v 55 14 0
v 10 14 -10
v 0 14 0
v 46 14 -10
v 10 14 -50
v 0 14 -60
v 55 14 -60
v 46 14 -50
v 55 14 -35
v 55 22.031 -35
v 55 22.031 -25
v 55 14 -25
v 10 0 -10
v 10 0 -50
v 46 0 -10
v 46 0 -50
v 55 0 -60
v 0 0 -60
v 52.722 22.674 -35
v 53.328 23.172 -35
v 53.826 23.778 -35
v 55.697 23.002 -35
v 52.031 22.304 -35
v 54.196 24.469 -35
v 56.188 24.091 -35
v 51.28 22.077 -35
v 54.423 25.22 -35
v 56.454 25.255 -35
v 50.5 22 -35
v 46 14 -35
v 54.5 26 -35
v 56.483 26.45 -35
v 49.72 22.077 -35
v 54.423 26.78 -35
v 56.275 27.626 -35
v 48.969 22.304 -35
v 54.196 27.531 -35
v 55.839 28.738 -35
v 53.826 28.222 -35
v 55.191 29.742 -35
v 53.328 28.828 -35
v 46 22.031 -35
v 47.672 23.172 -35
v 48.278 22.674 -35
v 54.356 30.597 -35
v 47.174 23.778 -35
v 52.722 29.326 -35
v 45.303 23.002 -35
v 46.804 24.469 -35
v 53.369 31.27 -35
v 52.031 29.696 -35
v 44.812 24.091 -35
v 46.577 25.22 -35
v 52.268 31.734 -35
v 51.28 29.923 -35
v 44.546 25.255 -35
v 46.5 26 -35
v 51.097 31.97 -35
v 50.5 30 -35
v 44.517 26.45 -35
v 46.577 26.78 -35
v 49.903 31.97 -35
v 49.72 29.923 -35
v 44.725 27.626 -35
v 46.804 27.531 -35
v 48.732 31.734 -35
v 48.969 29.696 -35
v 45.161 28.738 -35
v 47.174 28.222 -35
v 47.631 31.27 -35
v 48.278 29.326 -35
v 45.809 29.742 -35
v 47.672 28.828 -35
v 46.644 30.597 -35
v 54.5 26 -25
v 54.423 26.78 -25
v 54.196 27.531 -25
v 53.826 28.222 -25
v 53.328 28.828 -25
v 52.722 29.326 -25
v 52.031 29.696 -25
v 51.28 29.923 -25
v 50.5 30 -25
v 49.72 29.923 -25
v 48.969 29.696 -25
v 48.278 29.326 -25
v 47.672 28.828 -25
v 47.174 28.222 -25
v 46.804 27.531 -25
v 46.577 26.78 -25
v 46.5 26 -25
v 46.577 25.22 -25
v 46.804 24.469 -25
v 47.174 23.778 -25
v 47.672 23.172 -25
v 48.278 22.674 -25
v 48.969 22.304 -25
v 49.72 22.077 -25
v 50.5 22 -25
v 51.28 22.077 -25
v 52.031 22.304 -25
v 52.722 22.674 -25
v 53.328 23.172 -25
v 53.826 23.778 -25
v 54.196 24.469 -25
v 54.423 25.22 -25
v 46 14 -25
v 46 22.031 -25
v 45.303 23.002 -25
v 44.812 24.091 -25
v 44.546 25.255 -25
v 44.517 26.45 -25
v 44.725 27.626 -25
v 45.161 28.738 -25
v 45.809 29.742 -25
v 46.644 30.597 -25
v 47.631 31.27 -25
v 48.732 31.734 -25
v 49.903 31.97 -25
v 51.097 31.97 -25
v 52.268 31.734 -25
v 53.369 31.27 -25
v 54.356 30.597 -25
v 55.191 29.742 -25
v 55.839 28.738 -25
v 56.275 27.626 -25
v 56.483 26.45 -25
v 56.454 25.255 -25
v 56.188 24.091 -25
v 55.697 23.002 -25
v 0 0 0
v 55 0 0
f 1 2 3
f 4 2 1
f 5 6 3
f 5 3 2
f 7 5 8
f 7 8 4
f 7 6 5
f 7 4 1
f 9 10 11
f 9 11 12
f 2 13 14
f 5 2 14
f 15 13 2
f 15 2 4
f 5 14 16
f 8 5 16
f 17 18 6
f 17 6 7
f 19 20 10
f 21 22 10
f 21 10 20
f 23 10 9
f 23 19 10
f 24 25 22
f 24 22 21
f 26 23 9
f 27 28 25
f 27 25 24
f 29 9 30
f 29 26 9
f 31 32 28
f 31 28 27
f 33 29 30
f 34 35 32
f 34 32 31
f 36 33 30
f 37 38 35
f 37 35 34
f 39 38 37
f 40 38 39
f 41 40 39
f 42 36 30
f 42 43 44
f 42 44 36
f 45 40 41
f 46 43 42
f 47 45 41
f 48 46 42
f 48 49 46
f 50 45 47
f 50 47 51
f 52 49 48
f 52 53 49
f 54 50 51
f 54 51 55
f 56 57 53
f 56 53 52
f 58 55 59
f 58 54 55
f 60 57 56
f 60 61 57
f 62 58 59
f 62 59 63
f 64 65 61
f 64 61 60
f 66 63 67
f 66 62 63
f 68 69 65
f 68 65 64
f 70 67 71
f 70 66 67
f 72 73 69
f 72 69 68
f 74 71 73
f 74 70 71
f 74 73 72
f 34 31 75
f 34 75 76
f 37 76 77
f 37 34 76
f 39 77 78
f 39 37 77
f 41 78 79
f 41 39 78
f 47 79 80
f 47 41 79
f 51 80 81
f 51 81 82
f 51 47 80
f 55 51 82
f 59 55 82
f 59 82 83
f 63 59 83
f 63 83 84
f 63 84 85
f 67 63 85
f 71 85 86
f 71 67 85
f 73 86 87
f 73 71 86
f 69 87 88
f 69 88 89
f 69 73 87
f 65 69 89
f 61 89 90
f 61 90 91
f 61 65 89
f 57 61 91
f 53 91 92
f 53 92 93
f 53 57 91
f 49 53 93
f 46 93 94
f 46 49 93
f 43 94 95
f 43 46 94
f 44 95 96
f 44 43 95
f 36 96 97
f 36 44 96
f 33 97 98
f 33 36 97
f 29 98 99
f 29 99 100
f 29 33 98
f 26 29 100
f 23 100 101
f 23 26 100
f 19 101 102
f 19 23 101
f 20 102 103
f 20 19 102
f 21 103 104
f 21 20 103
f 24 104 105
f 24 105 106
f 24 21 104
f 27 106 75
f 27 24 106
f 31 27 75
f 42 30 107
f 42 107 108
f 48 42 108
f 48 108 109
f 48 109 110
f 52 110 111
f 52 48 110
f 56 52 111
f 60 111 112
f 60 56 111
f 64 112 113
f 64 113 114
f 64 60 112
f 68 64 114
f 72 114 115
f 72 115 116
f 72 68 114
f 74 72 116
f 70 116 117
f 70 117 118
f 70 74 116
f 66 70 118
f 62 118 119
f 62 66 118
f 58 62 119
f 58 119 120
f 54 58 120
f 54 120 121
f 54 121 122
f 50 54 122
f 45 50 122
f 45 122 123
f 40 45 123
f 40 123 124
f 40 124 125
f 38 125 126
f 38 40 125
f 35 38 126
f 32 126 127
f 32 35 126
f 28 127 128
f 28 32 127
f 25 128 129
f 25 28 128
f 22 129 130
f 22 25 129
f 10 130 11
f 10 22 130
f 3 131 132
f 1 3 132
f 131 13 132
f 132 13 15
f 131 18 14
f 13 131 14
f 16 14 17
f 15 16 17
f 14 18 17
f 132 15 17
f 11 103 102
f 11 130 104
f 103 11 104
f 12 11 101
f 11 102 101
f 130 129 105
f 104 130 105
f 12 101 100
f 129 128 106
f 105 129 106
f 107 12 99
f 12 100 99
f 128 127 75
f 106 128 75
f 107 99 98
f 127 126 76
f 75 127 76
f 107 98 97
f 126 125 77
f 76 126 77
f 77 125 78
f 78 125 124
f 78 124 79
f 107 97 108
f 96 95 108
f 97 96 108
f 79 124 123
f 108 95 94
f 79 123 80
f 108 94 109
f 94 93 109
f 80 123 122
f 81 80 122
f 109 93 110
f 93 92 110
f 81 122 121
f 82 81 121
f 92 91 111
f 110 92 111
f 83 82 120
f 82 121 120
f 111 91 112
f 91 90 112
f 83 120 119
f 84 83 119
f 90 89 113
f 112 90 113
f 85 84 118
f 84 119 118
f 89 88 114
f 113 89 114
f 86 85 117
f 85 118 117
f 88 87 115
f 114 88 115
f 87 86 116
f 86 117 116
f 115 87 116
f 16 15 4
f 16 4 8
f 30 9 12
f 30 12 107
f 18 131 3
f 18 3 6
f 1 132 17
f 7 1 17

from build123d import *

# Parameters (mm, degrees)
SKETCH_1_W          = 55
SKETCH_1_H          = 60
EXTRUDE_1_DEPTH     = 14
SKETCH_5_W          = 36
SKETCH_5_H          = 40
CUT_EXTRUDE_1_DEPTH = 15
EXTRUDE_START       = -35
SKETCH_7_R          = 4
EXTRUDE_2_DEPTH     = 10


with BuildPart() as part:
    # 草图1 → 凸台-拉伸1 (new body)
    with BuildSketch(Plane(origin=(0, 0, 0), x_dir=(1, 0, 0), z_dir=(0, 1, 0))):
        with Locations((27.5, 30)):
            Rectangle(SKETCH_1_W, SKETCH_1_H)
    extrude(amount=EXTRUDE_1_DEPTH)

    # 草图5 → 切除-拉伸1 (cut)
    with BuildSketch(Plane(origin=(0, 0, 0), x_dir=(1, 0, 0), z_dir=(0, 1, 0))):
        with Locations((28, 30)):
            Rectangle(SKETCH_5_W, SKETCH_5_H)
    extrude(amount=CUT_EXTRUDE_1_DEPTH, mode=Mode.SUBTRACT)


with BuildPart() as body_2:
    # 草图7 → 凸台-拉伸2 (new body)
    with BuildSketch(Plane.XY.offset(EXTRUDE_START)):
        with BuildLine():
            Line((55, 14), (50.5, 14))
            Line((50.5, 14), (46, 14))
            Line((46, 14), (46, 22.031373033))
            ThreePointArc((46, 22.031373033), (50.5, 32), (55, 22.031373033))
            Line((55, 22.031373033), (55, 14))
        make_face()
        with Locations((50.5, 26)):
            Circle(SKETCH_7_R, mode=Mode.SUBTRACT)
    extrude(amount=EXTRUDE_2_DEPTH)


solid = Compound([part.part, body_2.part])
